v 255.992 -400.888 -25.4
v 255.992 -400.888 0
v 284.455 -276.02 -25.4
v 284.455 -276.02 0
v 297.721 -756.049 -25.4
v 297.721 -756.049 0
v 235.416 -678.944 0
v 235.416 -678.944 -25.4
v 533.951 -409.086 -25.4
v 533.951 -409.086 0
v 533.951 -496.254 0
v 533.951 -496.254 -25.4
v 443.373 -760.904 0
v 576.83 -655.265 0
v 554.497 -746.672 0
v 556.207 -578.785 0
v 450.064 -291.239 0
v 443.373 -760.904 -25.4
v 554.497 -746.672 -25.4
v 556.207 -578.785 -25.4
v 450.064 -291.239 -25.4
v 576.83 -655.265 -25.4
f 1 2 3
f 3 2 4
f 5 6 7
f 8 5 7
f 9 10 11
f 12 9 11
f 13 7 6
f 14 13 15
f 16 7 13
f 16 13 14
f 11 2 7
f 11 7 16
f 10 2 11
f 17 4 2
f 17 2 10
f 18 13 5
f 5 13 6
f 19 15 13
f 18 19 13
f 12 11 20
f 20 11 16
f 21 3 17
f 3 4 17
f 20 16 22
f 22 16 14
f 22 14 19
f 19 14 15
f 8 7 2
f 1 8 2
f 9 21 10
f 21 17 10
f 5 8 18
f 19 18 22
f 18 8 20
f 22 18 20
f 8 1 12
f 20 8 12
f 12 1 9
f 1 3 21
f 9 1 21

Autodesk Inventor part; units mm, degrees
ref_plane "YZ Plane" through (0, 0, 0) normal (1, 0, 0) x (0, 1, 0)
ref_plane "XZ Plane" through (0, 0, 0) normal (0, 1, 0) x (-1, 0, 0)
ref_plane "XY Plane" through (0, 0, 0) normal (0, 0, 1) x (1, 0, 0)
sketch "Sketch1" plane through (0, 0, 0) normal (0, 0, 1) x (1, 0, 0)
  line L0 (-18.0719, 15.5659) -> (782.0281, 15.5659) construction
  line L1 (782.0281, 15.5659) -> (782.0281, -1051.2341) construction
  line L2 (782.0281, -1051.2341) -> (-18.0719, -1051.2341) construction
  line L3 (-18.0719, -1051.2341) -> (-18.0719, 15.5659) construction
  line L4 (450.0641, -291.2392) -> (533.9512, -409.0865)
  line L5 (533.9512, -409.0865) -> (533.9512, -496.2541)
  line L6 (533.9512, -496.2541) -> (556.2067, -578.785)
  line L7 (556.2067, -578.785) -> (576.8305, -655.2648)
  line L8 (576.8305, -655.2648) -> (554.4974, -746.6723)
  line L9 (554.4974, -746.6723) -> (443.3726, -760.9041)
  line L10 (443.3726, -760.9041) -> (297.7206, -756.0491)
  line L11 (297.7206, -756.0491) -> (235.4159, -678.9444)
  line L12 (235.4159, -678.9444) -> (255.9915, -400.8879)
  line L13 (255.9915, -400.8879) -> (284.4547, -276.0204)
  line L14 (284.4547, -276.0204) -> (450.0641, -291.2392)
  line L15 (576.8305, -760.9041) -> (235.4159, -760.9041)
  line L16 (235.4159, -760.9041) -> (235.4159, -276.0204)
  line L17 (235.4159, -276.0204) -> (576.8305, -276.0204)
  line L18 (576.8305, -276.0204) -> (576.8305, -760.9041)
  point P0 (0, 0)
  dimension "d7" = 341.4146
  dimension "d10" = 484.8837
extrude "Extrusion1" add sketch "Sketch1" against normal blind 25.4 contours L4 L5 L6 L7 L8 L9 L10 L11 L12 L13 L14
properties part number "bingo"
